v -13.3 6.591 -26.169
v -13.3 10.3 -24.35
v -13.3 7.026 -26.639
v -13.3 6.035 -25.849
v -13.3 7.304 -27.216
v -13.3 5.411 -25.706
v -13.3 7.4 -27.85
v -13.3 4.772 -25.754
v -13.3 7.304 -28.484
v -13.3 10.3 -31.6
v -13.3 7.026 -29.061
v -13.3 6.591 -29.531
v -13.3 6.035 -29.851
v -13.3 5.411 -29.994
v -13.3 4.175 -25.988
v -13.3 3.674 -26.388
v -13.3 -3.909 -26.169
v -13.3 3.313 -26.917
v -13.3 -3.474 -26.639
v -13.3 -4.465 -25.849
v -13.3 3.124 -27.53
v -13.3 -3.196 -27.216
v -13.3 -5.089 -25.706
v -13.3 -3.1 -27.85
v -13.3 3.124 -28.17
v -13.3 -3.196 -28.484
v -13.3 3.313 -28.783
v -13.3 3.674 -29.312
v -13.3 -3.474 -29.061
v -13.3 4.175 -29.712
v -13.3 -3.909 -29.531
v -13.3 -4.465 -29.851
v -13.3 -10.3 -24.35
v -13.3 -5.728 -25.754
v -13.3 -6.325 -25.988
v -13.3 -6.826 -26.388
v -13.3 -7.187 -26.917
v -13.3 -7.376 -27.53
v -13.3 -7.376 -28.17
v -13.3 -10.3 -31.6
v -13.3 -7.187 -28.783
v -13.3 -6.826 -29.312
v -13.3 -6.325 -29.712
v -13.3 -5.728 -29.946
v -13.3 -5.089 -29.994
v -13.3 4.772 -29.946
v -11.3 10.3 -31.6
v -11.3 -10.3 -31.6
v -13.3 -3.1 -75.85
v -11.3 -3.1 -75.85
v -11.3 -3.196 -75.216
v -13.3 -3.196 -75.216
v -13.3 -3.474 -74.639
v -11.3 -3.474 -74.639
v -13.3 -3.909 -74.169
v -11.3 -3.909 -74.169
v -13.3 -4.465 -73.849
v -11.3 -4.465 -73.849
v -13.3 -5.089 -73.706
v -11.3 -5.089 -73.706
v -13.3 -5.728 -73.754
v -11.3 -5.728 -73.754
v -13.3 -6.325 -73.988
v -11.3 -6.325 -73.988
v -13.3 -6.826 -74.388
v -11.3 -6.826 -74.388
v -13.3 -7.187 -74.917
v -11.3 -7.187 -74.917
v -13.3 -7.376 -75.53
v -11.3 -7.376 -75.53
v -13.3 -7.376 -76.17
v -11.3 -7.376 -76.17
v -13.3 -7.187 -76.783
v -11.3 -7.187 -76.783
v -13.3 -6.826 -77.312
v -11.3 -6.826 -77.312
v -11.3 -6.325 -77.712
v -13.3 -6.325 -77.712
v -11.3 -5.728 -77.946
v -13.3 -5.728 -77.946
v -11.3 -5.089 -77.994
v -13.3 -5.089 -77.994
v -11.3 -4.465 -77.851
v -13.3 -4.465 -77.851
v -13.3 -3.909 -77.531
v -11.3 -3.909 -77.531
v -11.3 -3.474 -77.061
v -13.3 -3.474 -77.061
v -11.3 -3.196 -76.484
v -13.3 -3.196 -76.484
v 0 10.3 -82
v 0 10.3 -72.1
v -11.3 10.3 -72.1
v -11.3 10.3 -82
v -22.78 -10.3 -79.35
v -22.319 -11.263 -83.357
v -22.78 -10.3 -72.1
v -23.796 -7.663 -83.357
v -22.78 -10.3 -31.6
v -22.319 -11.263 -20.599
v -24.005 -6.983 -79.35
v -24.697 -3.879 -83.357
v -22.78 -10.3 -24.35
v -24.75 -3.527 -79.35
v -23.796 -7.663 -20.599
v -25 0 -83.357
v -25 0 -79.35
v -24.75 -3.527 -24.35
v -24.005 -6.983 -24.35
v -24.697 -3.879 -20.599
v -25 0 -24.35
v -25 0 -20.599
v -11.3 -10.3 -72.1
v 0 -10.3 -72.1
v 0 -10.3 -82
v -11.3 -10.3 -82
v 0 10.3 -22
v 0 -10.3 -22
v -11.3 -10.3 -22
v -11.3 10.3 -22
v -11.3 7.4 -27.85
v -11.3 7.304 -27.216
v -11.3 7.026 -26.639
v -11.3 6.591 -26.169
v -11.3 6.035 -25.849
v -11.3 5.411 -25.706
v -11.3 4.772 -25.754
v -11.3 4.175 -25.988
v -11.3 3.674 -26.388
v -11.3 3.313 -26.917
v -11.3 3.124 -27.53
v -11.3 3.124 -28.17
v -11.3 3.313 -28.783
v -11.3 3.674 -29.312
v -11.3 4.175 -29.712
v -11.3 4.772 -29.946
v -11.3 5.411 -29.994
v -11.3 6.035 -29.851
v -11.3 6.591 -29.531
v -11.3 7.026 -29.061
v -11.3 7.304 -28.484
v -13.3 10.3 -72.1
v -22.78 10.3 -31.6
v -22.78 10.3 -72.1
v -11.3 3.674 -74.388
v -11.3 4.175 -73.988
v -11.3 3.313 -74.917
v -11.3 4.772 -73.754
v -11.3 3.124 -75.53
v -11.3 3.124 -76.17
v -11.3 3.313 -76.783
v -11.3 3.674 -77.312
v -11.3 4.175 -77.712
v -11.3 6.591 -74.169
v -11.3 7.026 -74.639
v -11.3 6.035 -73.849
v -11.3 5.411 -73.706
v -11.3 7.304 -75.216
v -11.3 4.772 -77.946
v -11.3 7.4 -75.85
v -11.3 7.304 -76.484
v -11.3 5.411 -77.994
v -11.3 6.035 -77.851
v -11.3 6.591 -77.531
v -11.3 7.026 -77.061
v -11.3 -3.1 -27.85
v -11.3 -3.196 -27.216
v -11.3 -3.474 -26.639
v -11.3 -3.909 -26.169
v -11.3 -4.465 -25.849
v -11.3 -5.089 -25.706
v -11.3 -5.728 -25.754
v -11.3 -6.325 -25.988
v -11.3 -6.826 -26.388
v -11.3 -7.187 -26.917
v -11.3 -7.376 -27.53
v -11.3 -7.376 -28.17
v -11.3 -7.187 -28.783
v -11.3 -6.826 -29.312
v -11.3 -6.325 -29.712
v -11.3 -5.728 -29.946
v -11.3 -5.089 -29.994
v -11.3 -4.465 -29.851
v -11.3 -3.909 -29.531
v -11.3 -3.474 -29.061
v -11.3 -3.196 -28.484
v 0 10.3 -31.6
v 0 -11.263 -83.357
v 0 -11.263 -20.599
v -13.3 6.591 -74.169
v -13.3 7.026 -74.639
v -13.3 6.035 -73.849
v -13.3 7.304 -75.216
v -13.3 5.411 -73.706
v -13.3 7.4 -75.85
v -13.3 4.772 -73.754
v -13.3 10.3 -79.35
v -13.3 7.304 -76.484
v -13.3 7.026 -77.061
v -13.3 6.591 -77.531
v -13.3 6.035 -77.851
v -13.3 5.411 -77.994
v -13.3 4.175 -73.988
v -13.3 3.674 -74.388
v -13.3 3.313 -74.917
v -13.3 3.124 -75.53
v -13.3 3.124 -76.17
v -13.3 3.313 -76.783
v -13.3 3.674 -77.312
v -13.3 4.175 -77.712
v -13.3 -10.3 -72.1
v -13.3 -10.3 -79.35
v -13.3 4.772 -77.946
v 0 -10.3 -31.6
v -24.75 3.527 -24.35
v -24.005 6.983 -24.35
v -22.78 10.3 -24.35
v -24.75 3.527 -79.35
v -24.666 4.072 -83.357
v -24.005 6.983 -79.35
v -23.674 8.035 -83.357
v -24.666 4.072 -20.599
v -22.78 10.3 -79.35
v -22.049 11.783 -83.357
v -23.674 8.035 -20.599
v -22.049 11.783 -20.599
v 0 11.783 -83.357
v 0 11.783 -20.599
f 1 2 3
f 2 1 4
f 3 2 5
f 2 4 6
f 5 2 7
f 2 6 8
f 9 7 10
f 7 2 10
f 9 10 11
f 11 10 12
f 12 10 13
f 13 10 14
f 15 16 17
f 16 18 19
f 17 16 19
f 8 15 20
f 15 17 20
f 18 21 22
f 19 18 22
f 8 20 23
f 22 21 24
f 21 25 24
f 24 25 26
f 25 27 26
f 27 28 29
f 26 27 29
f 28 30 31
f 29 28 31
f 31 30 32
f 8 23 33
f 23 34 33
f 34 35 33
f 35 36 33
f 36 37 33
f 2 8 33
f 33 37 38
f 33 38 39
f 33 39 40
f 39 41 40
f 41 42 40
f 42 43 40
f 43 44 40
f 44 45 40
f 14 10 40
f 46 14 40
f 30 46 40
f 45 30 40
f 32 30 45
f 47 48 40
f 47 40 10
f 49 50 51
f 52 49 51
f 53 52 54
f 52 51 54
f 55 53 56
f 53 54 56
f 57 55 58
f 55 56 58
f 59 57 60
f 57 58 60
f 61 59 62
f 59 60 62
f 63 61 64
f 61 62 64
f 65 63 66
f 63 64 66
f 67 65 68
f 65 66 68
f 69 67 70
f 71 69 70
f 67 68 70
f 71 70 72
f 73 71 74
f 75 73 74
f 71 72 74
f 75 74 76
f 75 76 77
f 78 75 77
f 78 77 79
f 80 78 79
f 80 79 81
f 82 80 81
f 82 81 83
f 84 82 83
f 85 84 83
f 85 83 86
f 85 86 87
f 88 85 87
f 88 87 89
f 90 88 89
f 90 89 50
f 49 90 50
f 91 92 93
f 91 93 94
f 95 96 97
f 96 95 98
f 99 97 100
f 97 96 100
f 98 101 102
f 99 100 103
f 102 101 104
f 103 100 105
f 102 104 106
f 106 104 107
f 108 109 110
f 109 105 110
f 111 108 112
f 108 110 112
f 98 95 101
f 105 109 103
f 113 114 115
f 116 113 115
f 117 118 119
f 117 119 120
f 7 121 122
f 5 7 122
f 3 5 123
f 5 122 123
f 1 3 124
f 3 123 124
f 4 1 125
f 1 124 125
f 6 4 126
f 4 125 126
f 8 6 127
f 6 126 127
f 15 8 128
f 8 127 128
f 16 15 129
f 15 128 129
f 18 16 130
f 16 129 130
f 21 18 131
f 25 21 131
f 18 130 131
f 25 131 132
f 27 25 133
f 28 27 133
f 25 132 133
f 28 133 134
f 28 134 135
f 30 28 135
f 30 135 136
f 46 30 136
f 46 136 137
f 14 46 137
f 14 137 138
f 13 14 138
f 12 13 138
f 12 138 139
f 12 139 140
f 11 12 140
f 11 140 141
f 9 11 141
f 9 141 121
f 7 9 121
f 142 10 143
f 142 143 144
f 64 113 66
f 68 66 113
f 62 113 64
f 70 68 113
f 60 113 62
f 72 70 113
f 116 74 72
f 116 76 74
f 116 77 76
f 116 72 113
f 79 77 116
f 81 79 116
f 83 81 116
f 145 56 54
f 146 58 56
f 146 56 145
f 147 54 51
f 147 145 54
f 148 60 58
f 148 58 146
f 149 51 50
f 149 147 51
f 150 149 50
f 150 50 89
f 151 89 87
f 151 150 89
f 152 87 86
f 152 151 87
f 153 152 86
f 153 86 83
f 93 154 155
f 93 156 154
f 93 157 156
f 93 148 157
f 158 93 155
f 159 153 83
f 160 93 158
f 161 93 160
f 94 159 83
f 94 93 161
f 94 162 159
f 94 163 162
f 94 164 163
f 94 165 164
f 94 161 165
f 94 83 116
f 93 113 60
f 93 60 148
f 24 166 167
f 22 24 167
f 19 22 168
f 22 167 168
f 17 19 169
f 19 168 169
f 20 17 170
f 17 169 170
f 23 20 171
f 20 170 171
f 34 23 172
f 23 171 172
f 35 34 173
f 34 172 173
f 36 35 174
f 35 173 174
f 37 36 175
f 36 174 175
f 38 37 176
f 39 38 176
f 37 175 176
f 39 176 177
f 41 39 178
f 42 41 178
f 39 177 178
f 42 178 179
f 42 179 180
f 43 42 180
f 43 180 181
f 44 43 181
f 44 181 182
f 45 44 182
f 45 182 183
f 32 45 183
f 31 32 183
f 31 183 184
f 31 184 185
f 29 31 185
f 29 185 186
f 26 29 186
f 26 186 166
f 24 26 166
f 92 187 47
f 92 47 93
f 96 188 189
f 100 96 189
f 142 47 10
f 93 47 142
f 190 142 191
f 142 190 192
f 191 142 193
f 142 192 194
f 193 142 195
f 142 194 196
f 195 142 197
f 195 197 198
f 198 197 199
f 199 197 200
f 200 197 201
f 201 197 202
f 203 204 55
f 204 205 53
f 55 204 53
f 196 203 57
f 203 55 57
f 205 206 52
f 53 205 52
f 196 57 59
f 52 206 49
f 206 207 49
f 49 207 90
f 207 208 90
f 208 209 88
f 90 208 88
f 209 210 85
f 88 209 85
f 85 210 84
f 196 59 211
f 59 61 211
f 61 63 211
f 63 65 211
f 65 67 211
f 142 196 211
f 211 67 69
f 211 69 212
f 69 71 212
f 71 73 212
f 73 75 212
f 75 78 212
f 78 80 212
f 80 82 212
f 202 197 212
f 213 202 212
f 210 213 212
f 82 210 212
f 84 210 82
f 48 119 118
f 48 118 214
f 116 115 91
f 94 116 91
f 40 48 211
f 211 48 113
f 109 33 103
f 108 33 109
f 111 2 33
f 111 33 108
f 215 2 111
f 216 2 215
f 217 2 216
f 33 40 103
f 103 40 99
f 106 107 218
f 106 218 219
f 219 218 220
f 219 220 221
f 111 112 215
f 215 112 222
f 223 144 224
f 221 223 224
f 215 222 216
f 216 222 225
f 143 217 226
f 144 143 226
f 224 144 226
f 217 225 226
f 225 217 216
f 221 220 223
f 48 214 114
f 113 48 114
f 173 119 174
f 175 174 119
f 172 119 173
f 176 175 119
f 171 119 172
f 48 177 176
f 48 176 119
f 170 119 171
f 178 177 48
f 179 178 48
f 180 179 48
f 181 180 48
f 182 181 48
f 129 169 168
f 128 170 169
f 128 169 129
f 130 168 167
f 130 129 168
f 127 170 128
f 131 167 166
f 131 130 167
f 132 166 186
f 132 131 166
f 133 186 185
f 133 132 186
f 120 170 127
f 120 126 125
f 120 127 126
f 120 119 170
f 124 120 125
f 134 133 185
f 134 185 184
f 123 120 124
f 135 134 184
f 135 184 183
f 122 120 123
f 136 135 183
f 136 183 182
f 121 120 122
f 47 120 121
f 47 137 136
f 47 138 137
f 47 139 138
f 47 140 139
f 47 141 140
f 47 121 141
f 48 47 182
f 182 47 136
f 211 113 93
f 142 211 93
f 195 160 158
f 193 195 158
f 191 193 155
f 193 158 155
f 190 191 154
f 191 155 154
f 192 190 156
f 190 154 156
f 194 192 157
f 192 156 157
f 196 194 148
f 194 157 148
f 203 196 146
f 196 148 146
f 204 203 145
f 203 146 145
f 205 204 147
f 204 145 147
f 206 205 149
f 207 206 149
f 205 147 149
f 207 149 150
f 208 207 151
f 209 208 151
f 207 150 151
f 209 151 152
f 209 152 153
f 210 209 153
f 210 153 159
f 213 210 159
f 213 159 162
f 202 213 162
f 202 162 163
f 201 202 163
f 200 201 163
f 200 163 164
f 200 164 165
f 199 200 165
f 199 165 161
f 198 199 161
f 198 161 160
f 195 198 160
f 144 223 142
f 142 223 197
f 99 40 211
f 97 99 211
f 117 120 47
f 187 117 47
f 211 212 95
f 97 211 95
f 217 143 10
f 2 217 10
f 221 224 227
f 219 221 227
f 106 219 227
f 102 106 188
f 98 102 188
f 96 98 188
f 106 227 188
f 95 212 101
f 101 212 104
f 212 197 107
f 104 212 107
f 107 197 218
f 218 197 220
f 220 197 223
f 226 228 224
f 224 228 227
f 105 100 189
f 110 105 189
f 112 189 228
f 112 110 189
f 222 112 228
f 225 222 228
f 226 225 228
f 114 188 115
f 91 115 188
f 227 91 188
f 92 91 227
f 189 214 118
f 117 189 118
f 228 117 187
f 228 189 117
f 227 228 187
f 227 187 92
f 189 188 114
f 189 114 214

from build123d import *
from build123d.topology import SkipClean

# Parameters (mm, degrees)
SKETCH1_R                = 25
SKETCH1_W                = 27.5
SKETCH1_H                = 27.5
BOSS_EXTRUDE1_DEPTH      = 55
BOSS_EXTRUDE2_START      = 5
SKETCH2_R                = 25
BOSS_EXTRUDE2_DEPTH      = 5
SKETCH3_W                = 25
SKETCH3_H                = 50
BOSS_EXTRUDE3_DEPTH      = 80
FILLET1_R                = 2.5
FILLET2_R                = 2.5
SKETCH21_W               = 60
SKETCH21_H               = 20.6
CUT_EXTRUDE1_DEPTH       = 11.3
SKETCH22_W               = 40.5
SKETCH22_H               = 20.6
CUT_EXTRUDE2_DEPTH       = 93.059763198
CUT_EXTRUDE3_DEPTH       = 88.464278423
SKETCH23_R               = 2.15
CUT_EXTRUDE4_DEPTH       = 93.059763198
CUT_EXTRUDE7_DEPTH       = 27.5
CUT_EXTRUDE9_DEPTH       = 93.059763198
CUT_EXTRUDE10_DEPTH      = 91.545224131
CUT_EXTRUDE10_DEPTH_BACK = 91.545224131
SKETCH26_W               = 75.598787472
SKETCH26_H               = 50


with BuildPart() as part:
    # Sketch1 → Boss-Extrude1 (new body)
    with BuildSketch(Plane.XY):
        Circle(SKETCH1_R)
        Rectangle(SKETCH1_W, SKETCH1_H, mode=Mode.SUBTRACT)
    extrude(amount=BOSS_EXTRUDE1_DEPTH)

    # Sketch2 → Boss-Extrude2 (add)
    with BuildSketch(Plane(origin=(0, 0, 0), x_dir=(-1, 0, 0), z_dir=(0, 0, -1)).offset(BOSS_EXTRUDE2_START)):
        Circle(SKETCH2_R)
    extrude(amount=-BOSS_EXTRUDE2_DEPTH)

    # Sketch3 → Boss-Extrude3 (add)
    with BuildSketch(Plane(origin=(0, 0, -5), x_dir=(-1, 0, 0), z_dir=(0, 0, -1))):
        with Locations((12.5, 0)):
            Rectangle(SKETCH3_W, SKETCH3_H)
    extrude(amount=BOSS_EXTRUDE3_DEPTH)

    # Fillet1
    fillet1_edges = [part.edges().sort_by_distance(p)[0] for p in [
        (-13.75, 13.75, 27.5),
        (13.75, 13.75, 27.5),
        (-13.75, -13.75, 27.5),
        (13.75, -13.75, 27.5),
    ]]
    fillet(fillet1_edges, radius=FILLET1_R)

    # Fillet2
    fillet2_edges = [part.edges().sort_by_distance(p)[0] for p in [
        (13.75, 0, 55),
    ]]
    fillet(fillet2_edges, radius=FILLET2_R)

    # Sketch21 → Cut-Extrude1 (cut)
    with BuildSketch(Plane(origin=(0, 0, 0), x_dir=(0, 0, -1), z_dir=(1, 0, 0))):
        with Locations((52, 0)):
            Rectangle(SKETCH21_W, SKETCH21_H)
    extrude(amount=-CUT_EXTRUDE1_DEPTH, mode=Mode.SUBTRACT)

    # Sketch22 → Cut-Extrude2 (cut, through all)
    with BuildSketch(Plane(origin=(0, 0, 0), x_dir=(0, 0, -1), z_dir=(1, 0, 0))):
        with Locations((51.85, 0)):
            Rectangle(SKETCH22_W, SKETCH22_H)
    extrude(amount=-CUT_EXTRUDE2_DEPTH, mode=Mode.SUBTRACT)

    # Sketch18 → Cut-Extrude3 (cut, through all)
    with BuildSketch(Plane.XY.offset(-5)):
        with BuildLine():
            Line((-25, -25), (0, -25))
            ThreePointArc((0, -25), (-17.67766953, -17.67766953), (-25, 0))
            Line((-25, 0), (-25, -25))
        make_face()
        with BuildLine():
            Line((-25, 25), (-25, 0))
            ThreePointArc((-25, 0), (-17.67766953, 17.67766953), (0, 25))
            Line((0, 25), (-25, 25))
        make_face()
    extrude(amount=-CUT_EXTRUDE3_DEPTH, mode=Mode.SUBTRACT)

    # Sketch23 → Cut-Extrude4 (cut, through all)
    with BuildSketch(Plane(origin=(0, 0, 0), x_dir=(0, 0, -1), z_dir=(1, 0, 0))):
        with Locations((75.85, 5.25)):
            Circle(SKETCH23_R)
        with Locations((75.85, -5.25)):
            Circle(SKETCH23_R)
        with Locations((27.85, 5.25)):
            Circle(SKETCH23_R)
        with Locations((27.85, -5.25)):
            Circle(SKETCH23_R)
    extrude(amount=-CUT_EXTRUDE4_DEPTH, mode=Mode.SUBTRACT)

    # Sketch24 → Cut-Extrude7 (cut, symmetric)
    with BuildSketch(Plane(origin=(0, 0, -51.85), x_dir=(-1, 0, 0), z_dir=(0, 0, -1))):
        with BuildLine():
            Line((22.779596133, 10.3), (13.3, 10.3))
            Line((13.3, 10.3), (13.3, -10.3))
            Line((13.3, -10.3), (22.779596133, -10.3))
            ThreePointArc((22.779596133, -10.3), (25, 0), (22.779596133, 10.3))
        make_face()
    extrude(amount=CUT_EXTRUDE7_DEPTH, both=True, mode=Mode.SUBTRACT)

    # Sketch25 → Cut-Extrude9 (cut, through all)
    with BuildSketch(Plane(origin=(0, 0, 0), x_dir=(0, 0, -1), z_dir=(1, 0, 0))):
        Polygon((85, 25), (20.598787472, 25), (20.598787472, 11.783494563), (83.357288901, 11.783494563), (83.357288901, -11.262677124), (20.598787472, -11.262677124), (20.598787472, -25), (85, -25), (85, -11.262677124), (85, 11.783494563), align=None)
    extrude(amount=-CUT_EXTRUDE9_DEPTH, mode=Mode.SUBTRACT)

    # Sketch26 → Cut-Extrude10 (cut, two sides: drawn at the far end of the back side and taken through both)
    with SkipClean():  # the faces are left unmerged after this step: merging them gives an invalid solid
        with BuildSketch(Plane(origin=(0, 0, 0), x_dir=(0, 0, -1), z_dir=(1, 0, 0)).offset(-CUT_EXTRUDE10_DEPTH_BACK)):
            with Locations((-17.200606264, 0)):
                Rectangle(SKETCH26_W, SKETCH26_H)
        extrude(amount=CUT_EXTRUDE10_DEPTH + CUT_EXTRUDE10_DEPTH_BACK, mode=Mode.SUBTRACT)


solid = part.part
